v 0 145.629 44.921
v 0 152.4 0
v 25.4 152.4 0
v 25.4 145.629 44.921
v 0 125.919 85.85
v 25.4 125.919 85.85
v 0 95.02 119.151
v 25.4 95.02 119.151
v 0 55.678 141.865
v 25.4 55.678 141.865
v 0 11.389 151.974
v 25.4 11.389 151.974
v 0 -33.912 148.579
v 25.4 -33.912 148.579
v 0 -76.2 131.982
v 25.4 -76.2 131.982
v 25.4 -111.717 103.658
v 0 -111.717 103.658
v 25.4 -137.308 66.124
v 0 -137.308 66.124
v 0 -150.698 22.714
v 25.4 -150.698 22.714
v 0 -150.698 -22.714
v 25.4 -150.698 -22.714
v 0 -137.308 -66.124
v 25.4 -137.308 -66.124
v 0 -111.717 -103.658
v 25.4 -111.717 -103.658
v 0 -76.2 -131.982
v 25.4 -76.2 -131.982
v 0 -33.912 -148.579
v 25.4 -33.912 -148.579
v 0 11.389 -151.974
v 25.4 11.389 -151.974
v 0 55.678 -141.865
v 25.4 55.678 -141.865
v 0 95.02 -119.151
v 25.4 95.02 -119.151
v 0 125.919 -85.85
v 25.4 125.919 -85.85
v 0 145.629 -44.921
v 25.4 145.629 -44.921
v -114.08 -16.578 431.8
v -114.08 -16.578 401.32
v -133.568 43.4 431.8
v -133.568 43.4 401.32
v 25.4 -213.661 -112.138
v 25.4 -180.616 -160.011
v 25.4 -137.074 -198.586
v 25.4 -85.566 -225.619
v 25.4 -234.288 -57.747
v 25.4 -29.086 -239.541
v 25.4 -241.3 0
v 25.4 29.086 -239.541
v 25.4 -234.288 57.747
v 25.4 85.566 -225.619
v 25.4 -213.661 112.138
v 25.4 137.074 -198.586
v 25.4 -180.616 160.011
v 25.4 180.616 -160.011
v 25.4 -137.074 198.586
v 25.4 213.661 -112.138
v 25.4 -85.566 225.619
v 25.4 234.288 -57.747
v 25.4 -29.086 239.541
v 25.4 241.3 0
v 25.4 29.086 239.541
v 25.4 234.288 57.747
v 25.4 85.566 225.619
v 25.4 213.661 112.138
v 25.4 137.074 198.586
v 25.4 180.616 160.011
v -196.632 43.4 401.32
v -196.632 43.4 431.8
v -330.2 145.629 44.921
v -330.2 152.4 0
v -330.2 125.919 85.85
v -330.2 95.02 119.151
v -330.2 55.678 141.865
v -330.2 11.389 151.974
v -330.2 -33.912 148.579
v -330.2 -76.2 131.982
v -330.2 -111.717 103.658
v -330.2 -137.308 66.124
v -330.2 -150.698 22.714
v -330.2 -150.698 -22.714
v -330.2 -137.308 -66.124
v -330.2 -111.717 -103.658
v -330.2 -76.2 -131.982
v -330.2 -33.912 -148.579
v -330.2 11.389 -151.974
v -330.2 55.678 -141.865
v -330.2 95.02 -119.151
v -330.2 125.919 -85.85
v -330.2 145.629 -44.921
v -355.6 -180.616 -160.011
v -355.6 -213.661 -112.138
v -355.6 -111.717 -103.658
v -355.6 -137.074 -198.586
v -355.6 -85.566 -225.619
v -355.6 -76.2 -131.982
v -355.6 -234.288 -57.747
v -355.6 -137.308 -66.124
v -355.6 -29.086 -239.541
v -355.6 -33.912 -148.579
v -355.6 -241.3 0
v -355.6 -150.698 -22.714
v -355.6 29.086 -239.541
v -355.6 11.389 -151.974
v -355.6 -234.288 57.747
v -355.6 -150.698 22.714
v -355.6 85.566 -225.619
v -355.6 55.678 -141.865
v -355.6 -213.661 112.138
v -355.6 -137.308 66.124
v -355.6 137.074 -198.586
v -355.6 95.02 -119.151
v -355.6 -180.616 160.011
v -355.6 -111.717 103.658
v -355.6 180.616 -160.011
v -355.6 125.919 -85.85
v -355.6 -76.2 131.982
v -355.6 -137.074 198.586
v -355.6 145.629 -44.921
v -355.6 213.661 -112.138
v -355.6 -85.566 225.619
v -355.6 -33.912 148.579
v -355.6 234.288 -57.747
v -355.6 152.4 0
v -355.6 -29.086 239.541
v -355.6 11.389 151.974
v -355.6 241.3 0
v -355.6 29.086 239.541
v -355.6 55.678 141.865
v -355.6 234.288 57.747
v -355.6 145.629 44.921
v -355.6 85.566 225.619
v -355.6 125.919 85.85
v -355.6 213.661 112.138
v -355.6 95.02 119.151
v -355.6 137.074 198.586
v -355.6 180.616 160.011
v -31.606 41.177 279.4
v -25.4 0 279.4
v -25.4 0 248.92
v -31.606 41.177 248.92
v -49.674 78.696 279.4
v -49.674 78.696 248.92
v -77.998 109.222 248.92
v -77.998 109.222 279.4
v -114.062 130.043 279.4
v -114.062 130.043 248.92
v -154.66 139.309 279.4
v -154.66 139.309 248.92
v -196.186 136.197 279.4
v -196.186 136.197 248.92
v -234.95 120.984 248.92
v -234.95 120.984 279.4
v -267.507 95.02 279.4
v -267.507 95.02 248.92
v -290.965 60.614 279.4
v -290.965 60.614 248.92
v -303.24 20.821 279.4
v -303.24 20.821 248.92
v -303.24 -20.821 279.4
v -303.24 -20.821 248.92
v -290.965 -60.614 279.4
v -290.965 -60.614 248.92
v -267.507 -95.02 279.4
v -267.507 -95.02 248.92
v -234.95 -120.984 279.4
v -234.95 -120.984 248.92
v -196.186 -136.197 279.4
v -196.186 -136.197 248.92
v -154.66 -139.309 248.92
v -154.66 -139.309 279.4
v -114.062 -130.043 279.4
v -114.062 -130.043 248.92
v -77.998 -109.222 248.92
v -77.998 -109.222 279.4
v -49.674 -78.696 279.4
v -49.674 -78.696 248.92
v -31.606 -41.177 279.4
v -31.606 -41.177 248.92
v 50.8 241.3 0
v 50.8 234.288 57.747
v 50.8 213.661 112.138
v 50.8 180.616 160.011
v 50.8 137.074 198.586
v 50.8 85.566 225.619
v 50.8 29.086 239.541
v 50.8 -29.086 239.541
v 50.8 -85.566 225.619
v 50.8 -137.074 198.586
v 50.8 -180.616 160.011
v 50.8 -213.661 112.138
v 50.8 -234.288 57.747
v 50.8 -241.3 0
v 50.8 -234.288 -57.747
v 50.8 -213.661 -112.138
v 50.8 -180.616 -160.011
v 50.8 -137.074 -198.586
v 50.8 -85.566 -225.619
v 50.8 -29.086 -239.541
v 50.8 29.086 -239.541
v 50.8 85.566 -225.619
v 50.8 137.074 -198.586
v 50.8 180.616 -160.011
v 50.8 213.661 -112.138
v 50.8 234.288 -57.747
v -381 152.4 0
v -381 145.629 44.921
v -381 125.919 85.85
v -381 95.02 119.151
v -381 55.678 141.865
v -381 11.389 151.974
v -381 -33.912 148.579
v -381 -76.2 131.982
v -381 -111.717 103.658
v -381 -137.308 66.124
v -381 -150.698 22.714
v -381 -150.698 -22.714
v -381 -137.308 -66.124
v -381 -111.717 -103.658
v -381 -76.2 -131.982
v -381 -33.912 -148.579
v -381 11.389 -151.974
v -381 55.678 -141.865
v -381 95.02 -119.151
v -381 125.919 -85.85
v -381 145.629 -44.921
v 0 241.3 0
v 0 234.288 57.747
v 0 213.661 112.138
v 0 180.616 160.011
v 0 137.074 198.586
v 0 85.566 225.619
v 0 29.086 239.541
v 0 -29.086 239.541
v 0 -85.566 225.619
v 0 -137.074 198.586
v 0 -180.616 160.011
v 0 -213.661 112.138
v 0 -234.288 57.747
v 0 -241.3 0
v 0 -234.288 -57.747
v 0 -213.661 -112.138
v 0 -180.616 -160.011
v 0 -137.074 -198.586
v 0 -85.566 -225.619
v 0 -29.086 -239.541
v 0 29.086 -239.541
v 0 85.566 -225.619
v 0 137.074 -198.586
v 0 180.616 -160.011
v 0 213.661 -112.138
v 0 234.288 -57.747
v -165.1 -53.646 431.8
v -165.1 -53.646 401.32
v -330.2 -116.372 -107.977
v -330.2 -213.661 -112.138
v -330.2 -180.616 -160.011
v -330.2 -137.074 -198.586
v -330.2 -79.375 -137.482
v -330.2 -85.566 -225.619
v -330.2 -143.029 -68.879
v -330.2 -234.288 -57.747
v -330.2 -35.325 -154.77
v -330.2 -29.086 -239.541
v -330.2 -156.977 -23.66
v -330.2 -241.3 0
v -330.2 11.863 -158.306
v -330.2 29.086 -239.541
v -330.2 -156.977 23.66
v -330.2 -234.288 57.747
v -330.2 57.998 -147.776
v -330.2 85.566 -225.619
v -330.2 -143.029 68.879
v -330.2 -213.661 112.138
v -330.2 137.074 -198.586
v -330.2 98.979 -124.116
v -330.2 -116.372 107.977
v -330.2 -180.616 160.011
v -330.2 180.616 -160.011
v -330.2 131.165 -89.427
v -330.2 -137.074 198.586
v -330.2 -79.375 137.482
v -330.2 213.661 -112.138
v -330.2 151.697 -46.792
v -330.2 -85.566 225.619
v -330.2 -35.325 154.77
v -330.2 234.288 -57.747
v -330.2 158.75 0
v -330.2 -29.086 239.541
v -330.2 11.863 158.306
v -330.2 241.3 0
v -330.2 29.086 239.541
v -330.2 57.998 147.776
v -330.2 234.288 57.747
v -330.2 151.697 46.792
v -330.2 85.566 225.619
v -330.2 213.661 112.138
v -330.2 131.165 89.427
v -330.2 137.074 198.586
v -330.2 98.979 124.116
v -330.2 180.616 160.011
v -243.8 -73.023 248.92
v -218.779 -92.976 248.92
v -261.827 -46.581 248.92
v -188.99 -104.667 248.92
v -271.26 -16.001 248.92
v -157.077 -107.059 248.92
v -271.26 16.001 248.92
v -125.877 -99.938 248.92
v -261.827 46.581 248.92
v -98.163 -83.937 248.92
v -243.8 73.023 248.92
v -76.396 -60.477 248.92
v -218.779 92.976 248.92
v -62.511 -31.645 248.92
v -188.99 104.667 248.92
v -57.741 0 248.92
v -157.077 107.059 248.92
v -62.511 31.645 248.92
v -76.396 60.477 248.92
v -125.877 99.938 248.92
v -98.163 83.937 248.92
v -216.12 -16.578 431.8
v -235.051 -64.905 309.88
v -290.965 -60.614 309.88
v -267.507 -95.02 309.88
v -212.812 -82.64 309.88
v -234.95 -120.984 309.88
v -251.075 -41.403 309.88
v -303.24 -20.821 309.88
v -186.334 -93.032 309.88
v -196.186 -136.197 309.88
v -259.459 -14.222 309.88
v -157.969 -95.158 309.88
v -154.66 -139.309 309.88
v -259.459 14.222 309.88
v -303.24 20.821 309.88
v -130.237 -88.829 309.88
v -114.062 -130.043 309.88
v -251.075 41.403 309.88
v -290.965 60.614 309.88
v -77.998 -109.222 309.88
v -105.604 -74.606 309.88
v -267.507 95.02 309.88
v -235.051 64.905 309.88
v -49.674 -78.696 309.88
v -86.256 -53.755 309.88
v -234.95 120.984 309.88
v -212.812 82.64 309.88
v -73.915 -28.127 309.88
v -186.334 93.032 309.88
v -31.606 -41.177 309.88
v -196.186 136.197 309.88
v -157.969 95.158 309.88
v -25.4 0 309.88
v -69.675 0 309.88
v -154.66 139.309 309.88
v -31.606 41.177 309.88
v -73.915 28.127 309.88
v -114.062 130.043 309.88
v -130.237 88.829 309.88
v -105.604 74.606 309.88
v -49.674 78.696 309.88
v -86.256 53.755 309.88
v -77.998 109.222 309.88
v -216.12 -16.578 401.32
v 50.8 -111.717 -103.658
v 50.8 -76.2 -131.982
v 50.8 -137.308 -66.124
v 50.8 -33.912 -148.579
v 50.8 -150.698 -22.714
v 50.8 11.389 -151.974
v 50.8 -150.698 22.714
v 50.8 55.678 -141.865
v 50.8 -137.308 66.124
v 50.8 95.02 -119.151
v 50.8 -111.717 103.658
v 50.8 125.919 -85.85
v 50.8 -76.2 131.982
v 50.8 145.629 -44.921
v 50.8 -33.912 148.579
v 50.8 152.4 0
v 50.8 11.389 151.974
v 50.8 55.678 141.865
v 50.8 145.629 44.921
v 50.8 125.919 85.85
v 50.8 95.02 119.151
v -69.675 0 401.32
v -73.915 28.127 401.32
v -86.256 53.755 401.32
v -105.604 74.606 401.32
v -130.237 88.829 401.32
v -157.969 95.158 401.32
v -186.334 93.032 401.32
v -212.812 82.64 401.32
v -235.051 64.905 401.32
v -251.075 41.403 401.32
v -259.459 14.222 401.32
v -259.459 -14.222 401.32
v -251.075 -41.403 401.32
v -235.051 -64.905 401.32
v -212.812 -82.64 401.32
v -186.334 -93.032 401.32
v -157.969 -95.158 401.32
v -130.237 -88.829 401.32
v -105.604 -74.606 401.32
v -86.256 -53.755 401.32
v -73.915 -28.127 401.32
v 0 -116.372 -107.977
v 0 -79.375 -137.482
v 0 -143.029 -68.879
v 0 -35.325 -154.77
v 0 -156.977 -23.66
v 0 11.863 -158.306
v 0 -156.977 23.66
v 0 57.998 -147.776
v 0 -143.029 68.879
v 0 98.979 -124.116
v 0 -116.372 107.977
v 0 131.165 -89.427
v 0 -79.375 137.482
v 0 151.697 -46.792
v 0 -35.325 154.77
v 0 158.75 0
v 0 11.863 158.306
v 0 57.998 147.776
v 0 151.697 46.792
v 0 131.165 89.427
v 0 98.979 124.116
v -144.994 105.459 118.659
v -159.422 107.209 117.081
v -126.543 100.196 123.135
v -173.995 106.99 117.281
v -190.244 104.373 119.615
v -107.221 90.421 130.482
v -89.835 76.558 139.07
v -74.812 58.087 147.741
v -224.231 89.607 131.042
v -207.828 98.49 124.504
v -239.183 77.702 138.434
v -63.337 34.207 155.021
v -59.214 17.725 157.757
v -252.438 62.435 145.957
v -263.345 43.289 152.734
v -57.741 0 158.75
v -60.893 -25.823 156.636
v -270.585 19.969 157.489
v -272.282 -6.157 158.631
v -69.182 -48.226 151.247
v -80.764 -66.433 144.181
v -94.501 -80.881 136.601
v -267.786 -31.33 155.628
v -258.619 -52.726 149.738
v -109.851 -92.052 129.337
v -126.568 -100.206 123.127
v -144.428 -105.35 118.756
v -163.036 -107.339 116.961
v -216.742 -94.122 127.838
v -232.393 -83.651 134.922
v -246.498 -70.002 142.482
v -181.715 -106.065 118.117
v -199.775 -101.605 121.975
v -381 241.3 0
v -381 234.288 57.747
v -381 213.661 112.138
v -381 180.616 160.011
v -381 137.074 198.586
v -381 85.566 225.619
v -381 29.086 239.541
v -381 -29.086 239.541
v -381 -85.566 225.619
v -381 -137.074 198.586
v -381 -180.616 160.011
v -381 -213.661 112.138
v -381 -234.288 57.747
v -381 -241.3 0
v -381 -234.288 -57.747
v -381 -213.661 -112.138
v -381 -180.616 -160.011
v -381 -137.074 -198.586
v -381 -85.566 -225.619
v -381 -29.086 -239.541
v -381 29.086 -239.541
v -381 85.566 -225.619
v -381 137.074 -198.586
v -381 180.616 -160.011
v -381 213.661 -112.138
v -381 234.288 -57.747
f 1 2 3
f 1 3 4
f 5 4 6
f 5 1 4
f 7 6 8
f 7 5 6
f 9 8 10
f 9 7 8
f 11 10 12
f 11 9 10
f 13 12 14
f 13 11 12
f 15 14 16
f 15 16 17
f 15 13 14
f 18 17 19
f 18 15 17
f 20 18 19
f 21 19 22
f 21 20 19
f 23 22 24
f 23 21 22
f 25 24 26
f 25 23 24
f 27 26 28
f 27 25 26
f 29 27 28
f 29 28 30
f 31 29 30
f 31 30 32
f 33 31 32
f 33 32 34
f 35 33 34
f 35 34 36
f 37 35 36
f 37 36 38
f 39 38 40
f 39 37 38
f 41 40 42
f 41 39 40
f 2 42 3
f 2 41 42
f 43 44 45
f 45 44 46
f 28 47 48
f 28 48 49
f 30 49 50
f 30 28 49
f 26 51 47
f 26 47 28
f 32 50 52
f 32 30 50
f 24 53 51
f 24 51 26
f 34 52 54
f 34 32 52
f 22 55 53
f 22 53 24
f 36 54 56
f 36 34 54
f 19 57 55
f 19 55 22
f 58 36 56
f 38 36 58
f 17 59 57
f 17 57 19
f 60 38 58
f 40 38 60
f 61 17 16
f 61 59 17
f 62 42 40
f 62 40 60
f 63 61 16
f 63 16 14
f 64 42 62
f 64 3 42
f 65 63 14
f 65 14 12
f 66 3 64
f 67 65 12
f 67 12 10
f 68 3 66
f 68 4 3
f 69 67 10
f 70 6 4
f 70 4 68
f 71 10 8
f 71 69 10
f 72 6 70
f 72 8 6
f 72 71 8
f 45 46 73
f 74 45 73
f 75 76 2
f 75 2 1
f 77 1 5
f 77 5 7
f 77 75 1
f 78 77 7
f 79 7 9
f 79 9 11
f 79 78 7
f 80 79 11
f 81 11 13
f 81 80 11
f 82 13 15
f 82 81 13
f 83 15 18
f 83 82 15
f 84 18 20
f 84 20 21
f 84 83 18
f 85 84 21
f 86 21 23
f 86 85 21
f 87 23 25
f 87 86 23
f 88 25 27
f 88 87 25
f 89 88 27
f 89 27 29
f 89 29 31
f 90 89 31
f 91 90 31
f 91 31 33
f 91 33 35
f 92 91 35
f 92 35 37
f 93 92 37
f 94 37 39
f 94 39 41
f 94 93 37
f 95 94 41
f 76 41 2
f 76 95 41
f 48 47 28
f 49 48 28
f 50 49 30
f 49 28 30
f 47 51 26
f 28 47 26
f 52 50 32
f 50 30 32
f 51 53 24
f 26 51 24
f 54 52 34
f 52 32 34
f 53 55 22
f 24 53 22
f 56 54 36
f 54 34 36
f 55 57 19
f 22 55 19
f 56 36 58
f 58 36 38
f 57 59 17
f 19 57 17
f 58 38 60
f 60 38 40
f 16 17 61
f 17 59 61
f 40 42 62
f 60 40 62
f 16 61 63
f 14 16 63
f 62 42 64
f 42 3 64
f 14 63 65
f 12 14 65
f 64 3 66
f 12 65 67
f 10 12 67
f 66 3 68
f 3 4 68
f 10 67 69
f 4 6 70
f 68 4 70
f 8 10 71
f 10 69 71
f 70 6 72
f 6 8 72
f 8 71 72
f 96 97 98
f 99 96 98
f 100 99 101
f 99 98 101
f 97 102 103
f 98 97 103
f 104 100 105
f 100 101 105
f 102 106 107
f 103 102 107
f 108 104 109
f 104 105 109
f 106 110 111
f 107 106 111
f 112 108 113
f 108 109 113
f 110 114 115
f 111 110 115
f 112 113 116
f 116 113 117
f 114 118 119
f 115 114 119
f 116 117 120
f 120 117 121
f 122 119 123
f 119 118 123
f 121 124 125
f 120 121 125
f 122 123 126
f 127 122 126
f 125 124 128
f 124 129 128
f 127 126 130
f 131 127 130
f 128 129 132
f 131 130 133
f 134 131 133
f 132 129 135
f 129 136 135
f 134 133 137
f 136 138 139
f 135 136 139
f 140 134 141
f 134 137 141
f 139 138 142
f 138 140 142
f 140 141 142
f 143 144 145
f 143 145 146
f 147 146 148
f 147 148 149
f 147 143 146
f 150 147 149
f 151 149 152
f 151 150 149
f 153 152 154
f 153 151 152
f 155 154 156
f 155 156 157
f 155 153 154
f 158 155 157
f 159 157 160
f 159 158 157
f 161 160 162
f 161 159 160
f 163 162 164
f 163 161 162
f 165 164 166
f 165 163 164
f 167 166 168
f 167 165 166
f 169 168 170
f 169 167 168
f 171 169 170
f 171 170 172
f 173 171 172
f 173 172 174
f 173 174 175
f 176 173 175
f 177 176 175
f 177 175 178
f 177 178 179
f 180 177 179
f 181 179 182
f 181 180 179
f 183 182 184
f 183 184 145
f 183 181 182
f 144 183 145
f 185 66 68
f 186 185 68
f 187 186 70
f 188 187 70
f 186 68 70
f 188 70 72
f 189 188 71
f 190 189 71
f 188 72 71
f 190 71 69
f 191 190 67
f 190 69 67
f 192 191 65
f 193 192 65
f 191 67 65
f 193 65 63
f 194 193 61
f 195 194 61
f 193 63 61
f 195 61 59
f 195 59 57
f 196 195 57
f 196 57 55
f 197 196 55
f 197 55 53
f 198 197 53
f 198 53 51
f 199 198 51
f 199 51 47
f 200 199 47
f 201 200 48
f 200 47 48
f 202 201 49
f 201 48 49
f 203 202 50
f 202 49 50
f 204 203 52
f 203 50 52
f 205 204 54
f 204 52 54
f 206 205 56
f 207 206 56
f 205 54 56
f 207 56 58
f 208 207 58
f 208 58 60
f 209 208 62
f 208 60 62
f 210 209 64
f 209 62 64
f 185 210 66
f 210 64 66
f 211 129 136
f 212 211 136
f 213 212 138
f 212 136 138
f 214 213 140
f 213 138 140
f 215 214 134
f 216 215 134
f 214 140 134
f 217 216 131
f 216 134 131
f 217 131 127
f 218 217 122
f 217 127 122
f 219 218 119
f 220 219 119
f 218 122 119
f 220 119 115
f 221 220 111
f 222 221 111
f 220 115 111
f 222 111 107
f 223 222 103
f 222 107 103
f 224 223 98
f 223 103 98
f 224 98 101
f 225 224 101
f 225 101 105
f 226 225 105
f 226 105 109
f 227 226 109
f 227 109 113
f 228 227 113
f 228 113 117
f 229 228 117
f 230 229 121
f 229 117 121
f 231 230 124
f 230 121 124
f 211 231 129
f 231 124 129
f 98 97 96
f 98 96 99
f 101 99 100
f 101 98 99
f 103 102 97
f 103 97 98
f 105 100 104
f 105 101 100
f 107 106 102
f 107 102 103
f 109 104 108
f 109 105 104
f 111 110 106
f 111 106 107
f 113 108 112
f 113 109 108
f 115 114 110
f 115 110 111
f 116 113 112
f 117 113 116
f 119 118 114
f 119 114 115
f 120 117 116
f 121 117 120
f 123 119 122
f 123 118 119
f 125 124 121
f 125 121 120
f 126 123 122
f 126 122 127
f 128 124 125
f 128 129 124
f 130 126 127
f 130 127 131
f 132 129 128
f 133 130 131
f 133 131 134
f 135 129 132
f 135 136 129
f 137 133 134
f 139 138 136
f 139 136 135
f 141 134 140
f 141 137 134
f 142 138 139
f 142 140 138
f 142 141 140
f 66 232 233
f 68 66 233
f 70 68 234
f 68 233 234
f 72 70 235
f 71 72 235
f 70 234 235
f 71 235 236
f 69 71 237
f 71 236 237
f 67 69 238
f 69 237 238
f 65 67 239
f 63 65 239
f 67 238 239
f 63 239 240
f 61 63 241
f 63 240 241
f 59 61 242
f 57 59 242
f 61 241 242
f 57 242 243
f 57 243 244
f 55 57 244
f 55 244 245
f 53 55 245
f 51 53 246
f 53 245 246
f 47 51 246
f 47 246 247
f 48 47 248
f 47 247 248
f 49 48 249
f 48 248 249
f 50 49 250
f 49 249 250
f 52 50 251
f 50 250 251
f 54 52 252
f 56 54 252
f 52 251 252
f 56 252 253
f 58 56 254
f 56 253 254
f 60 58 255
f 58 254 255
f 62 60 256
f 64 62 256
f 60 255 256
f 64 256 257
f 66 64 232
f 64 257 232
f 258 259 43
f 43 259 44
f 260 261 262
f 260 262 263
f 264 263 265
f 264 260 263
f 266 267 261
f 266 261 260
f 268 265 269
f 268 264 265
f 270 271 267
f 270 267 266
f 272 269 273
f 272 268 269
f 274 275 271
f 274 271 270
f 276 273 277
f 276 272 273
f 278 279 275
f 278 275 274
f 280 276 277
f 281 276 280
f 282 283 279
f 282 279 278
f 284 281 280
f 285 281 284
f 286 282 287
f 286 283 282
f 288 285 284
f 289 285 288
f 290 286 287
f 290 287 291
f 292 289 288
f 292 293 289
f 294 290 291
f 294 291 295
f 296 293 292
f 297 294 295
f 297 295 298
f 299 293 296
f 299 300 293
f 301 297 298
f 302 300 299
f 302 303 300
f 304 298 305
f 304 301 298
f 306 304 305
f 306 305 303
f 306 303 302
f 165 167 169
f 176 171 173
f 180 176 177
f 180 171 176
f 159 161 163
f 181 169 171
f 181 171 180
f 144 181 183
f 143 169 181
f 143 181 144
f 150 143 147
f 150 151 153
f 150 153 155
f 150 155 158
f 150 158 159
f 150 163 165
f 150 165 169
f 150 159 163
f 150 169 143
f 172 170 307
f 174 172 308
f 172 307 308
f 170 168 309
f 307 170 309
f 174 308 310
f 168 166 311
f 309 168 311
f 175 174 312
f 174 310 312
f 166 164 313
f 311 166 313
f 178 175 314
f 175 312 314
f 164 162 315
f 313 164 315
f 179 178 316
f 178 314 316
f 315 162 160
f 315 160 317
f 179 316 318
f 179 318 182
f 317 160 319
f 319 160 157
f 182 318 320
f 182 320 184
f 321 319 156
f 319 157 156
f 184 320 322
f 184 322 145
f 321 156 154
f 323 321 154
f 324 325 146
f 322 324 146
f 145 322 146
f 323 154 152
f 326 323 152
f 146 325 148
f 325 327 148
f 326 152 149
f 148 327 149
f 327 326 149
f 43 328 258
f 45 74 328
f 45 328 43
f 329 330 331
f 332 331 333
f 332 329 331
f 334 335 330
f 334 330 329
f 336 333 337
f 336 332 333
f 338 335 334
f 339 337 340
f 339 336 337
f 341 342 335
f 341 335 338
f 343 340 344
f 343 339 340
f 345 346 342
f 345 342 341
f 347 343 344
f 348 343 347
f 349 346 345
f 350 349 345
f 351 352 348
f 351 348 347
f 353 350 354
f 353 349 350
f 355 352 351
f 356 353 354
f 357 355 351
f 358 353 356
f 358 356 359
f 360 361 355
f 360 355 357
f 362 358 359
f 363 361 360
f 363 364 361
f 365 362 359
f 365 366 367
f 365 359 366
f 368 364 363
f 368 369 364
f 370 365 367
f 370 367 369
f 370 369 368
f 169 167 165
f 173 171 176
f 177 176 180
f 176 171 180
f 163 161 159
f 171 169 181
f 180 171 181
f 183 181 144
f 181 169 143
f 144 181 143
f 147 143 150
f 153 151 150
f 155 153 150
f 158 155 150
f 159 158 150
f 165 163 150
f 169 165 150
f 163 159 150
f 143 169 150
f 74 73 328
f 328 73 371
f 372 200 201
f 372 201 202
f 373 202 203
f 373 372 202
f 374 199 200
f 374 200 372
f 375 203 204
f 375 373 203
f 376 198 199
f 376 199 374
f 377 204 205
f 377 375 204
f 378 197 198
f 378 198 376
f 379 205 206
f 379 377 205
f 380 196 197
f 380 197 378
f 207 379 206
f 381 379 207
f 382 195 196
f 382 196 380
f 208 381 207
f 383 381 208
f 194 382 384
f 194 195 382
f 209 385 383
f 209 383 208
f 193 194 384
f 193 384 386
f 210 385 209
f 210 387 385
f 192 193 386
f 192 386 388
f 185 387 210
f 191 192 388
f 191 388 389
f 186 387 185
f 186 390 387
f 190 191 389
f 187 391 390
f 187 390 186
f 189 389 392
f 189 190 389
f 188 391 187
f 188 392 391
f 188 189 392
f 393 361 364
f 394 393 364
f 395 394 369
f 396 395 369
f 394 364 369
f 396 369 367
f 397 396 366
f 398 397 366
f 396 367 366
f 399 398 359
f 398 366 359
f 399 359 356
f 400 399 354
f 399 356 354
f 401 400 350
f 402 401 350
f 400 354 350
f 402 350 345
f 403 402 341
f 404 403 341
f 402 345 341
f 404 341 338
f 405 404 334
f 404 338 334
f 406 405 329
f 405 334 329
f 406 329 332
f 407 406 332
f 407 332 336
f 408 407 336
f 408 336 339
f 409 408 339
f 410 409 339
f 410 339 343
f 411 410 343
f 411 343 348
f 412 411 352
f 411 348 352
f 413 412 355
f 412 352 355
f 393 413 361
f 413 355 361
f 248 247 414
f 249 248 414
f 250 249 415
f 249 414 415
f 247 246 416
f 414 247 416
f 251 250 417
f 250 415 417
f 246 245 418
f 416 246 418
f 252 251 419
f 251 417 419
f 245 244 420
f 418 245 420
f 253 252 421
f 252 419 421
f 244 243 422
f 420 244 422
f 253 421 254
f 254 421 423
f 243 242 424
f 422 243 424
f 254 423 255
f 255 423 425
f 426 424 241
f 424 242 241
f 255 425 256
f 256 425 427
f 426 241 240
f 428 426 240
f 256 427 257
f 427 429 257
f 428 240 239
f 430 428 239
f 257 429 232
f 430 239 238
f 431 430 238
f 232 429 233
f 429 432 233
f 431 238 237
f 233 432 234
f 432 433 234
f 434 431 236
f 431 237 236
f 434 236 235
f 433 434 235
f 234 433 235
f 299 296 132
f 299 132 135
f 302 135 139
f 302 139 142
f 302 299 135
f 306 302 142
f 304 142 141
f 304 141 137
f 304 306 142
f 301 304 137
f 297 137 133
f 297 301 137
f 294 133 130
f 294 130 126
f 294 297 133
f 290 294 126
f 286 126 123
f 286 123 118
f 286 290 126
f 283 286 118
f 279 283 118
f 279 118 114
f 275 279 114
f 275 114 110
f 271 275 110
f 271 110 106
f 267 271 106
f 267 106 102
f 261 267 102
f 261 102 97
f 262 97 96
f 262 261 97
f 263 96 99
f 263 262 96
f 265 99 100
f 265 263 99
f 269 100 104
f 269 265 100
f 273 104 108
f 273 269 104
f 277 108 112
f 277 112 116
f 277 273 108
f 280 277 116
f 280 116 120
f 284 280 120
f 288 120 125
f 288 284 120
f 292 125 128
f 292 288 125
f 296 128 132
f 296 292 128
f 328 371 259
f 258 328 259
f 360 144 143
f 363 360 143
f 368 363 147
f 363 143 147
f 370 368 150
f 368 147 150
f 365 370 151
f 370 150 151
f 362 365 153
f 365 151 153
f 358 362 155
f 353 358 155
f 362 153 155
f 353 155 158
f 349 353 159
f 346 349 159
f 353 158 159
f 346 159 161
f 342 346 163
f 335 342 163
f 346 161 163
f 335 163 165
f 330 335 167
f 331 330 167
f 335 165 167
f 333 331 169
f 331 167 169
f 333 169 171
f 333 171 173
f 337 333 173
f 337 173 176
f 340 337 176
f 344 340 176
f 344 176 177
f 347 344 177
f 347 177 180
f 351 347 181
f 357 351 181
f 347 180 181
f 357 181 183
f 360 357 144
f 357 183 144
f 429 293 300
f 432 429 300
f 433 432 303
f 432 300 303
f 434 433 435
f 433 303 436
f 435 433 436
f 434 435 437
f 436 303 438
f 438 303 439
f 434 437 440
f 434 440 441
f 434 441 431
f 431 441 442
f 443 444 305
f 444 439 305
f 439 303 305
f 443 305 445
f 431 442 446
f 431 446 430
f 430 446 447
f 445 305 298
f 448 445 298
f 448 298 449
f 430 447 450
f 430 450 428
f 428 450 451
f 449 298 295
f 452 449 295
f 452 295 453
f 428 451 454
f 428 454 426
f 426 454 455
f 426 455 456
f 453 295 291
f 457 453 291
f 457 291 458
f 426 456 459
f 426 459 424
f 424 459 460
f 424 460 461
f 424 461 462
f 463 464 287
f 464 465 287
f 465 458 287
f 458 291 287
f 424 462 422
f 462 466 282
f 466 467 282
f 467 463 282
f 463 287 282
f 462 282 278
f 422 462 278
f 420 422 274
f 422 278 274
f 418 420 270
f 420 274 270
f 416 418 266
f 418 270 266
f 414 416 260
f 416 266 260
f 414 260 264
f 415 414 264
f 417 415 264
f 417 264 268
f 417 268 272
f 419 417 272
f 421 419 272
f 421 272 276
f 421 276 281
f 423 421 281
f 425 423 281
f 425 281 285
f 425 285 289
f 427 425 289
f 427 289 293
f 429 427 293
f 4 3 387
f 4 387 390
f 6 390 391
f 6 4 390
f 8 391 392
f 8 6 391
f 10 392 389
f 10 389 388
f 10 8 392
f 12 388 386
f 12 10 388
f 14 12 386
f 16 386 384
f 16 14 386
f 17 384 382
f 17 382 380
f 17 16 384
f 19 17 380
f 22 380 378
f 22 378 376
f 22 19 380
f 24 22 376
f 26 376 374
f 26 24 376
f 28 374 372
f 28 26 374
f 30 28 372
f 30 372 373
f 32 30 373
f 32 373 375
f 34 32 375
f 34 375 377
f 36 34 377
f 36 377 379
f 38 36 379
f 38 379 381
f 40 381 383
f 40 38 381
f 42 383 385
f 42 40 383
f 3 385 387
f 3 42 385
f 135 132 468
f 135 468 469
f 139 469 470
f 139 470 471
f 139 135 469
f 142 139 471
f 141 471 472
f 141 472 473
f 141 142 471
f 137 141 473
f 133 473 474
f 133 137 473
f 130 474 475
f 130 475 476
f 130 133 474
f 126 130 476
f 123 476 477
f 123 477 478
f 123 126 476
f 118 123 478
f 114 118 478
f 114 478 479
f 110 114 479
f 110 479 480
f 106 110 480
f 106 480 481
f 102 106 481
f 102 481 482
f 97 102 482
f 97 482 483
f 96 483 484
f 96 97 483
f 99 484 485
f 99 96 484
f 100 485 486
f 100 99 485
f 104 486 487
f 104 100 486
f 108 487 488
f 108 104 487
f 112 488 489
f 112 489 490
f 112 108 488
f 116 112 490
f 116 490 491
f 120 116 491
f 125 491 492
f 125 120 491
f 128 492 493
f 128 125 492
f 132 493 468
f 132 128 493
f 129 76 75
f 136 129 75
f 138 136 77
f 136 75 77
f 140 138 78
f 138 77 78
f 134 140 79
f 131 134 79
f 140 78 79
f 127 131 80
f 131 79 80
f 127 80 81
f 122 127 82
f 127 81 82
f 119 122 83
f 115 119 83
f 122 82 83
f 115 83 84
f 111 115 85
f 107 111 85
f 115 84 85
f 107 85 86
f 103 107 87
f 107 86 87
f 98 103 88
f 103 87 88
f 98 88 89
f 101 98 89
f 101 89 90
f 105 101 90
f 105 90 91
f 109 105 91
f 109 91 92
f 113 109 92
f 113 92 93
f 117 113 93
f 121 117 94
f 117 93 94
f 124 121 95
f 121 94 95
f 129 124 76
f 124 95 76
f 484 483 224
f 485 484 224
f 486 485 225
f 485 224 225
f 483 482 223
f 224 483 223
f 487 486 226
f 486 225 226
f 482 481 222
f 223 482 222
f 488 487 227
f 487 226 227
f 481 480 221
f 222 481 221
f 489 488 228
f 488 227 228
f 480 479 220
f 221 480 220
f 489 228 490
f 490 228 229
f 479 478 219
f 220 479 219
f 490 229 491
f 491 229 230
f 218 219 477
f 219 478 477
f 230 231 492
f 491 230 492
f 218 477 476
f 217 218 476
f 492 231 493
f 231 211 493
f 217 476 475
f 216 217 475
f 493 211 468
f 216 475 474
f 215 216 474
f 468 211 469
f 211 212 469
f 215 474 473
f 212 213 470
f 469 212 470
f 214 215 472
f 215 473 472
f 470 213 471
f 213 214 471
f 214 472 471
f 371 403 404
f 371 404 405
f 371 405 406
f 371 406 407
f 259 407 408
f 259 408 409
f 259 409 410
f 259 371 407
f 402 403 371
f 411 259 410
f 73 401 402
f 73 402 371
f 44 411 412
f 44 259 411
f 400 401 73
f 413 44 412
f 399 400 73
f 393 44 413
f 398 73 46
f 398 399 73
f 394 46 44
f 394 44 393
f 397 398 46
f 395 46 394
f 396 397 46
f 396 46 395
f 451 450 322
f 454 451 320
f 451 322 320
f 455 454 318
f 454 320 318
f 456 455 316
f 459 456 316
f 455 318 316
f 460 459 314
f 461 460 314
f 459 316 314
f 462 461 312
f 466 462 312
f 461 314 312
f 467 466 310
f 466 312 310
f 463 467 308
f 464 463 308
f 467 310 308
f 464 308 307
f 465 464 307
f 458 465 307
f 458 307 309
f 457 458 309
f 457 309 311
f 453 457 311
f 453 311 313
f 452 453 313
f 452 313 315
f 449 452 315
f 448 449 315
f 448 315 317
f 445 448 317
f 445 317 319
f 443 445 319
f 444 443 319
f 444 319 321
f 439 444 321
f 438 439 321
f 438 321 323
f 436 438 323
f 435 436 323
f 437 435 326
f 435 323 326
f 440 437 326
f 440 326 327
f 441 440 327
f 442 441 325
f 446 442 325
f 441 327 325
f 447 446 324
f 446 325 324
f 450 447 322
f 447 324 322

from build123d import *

# Parameters (mm, degrees)
F0_R      = 241.3
F0_R_2    = 152.4
F1_DEPTH  = 25.4
F3_R      = 241.3
F3_R_2    = 152.4
F4_DEPTH  = 25.4
F6_DEPTH  = 25.4
F7_DEPTH  = 25.4
F9_R      = 158.75
F9_R_2    = 152.4
F10_DEPTH = 330.2
F12_R     = 139.7
F13_DEPTH = 30.48
F14_R     = 107.3588969204
F15_REACH = 793.8778161324
F16_DEPTH = 30.48
F17_R     = 95.4249040927
F18_DEPTH = 91.44
F20_DEPTH = 30.48


with BuildPart() as f1:
    # F0 (on Right) → F1 (new body)
    with BuildSketch(Plane.YZ):
        Circle(F0_R)
        Circle(F0_R_2, mode=Mode.SUBTRACT)
    extrude(amount=F1_DEPTH)


with BuildPart() as f4:
    # F3 (on offset) → F4 (new body)
    with BuildSketch(Plane.YZ.offset(-330.2)):
        Circle(F3_R)
        Circle(F3_R_2, mode=Mode.SUBTRACT)
    extrude(amount=-F4_DEPTH)


with BuildPart() as f6:
    # F6 (new): a face of the model
    f6_faces = [f4.part.faces().sort_by_distance(p)[0] for p in [
        (-355.6, -234.475005348, 0),
    ]]
    extrude(f6_faces, amount=F6_DEPTH)


with BuildPart() as f7:
    # F7 (new): a face of the model
    f7_faces = [f1.part.faces().sort_by_distance(p)[0] for p in [
        (25.4, -234.475005348, 0),
    ]]
    extrude(f7_faces, amount=F7_DEPTH)


with BuildPart() as f1_1:
    add(f1.part)

    add(f4.part)  # F10 merges F4
    # F9 (on face) → F10 (join, through all)
    with BuildSketch(Plane.YZ.offset(-330.2)):
        Circle(F9_R)
        Circle(F9_R_2, mode=Mode.SUBTRACT)
    extrude(amount=F10_DEPTH)



with BuildPart() as f13:
    # F12 (on offset) → F13 (new body)
    with BuildSketch(Plane.XY.offset(279.4)):
        with Locations((-165.1, 0)):
            Circle(F12_R)
    extrude(amount=-F13_DEPTH)


with BuildPart() as f1_2:
    add(f1_1.part)

    add(f13.part)  # F15 merges F13
    f15_end = f1_2.faces().sort_by_distance((-165.1, -158.75, 0))[0]
    # F14 (on face) → F15 (join, up to a face of the model that its end follows)
    with BuildSketch(Plane(origin=(0, 0, 248.92), x_dir=(1, 0, 0), z_dir=(0, 0, -1))):
        with Locations((-165.1, 0)):
            Circle(F14_R)
    f15_long = extrude(amount=F15_REACH, mode=Mode.PRIVATE)
    add(split(f15_long, bisect_by=f15_end, keep=Keep.ALL, mode=Mode.PRIVATE).solids().sort_by_distance((-165.1, 0, 248.92))[0])


with BuildPart() as f16:
    # F16 (new): a face of the model
    f16_faces = [f1_2.part.faces().sort_by_distance(p)[0] for p in [
        (-165.1, 0, 279.4),
    ]]
    extrude(f16_faces, amount=F16_DEPTH)

    # F17 (on face) → F18 (join)
    with BuildSketch(Plane.XY.offset(309.88)):
        with Locations((-165.1, 0)):
            Circle(F17_R)
    extrude(amount=F18_DEPTH)

    # F19 (on face) → F20 (join)
    with BuildSketch(Plane.XY.offset(401.32)):
        Polygon((-133.5676910353, 43.4004999697), (-196.6323089647, 43.4004999697), (-216.1203476486, -16.5775158597), (-165.1, -53.6459682201), (-114.0796523514, -16.5775158597), align=None)
    extrude(amount=F20_DEPTH)


solid = Compound([f6.part, f7.part, f1_2.part, f16.part])
